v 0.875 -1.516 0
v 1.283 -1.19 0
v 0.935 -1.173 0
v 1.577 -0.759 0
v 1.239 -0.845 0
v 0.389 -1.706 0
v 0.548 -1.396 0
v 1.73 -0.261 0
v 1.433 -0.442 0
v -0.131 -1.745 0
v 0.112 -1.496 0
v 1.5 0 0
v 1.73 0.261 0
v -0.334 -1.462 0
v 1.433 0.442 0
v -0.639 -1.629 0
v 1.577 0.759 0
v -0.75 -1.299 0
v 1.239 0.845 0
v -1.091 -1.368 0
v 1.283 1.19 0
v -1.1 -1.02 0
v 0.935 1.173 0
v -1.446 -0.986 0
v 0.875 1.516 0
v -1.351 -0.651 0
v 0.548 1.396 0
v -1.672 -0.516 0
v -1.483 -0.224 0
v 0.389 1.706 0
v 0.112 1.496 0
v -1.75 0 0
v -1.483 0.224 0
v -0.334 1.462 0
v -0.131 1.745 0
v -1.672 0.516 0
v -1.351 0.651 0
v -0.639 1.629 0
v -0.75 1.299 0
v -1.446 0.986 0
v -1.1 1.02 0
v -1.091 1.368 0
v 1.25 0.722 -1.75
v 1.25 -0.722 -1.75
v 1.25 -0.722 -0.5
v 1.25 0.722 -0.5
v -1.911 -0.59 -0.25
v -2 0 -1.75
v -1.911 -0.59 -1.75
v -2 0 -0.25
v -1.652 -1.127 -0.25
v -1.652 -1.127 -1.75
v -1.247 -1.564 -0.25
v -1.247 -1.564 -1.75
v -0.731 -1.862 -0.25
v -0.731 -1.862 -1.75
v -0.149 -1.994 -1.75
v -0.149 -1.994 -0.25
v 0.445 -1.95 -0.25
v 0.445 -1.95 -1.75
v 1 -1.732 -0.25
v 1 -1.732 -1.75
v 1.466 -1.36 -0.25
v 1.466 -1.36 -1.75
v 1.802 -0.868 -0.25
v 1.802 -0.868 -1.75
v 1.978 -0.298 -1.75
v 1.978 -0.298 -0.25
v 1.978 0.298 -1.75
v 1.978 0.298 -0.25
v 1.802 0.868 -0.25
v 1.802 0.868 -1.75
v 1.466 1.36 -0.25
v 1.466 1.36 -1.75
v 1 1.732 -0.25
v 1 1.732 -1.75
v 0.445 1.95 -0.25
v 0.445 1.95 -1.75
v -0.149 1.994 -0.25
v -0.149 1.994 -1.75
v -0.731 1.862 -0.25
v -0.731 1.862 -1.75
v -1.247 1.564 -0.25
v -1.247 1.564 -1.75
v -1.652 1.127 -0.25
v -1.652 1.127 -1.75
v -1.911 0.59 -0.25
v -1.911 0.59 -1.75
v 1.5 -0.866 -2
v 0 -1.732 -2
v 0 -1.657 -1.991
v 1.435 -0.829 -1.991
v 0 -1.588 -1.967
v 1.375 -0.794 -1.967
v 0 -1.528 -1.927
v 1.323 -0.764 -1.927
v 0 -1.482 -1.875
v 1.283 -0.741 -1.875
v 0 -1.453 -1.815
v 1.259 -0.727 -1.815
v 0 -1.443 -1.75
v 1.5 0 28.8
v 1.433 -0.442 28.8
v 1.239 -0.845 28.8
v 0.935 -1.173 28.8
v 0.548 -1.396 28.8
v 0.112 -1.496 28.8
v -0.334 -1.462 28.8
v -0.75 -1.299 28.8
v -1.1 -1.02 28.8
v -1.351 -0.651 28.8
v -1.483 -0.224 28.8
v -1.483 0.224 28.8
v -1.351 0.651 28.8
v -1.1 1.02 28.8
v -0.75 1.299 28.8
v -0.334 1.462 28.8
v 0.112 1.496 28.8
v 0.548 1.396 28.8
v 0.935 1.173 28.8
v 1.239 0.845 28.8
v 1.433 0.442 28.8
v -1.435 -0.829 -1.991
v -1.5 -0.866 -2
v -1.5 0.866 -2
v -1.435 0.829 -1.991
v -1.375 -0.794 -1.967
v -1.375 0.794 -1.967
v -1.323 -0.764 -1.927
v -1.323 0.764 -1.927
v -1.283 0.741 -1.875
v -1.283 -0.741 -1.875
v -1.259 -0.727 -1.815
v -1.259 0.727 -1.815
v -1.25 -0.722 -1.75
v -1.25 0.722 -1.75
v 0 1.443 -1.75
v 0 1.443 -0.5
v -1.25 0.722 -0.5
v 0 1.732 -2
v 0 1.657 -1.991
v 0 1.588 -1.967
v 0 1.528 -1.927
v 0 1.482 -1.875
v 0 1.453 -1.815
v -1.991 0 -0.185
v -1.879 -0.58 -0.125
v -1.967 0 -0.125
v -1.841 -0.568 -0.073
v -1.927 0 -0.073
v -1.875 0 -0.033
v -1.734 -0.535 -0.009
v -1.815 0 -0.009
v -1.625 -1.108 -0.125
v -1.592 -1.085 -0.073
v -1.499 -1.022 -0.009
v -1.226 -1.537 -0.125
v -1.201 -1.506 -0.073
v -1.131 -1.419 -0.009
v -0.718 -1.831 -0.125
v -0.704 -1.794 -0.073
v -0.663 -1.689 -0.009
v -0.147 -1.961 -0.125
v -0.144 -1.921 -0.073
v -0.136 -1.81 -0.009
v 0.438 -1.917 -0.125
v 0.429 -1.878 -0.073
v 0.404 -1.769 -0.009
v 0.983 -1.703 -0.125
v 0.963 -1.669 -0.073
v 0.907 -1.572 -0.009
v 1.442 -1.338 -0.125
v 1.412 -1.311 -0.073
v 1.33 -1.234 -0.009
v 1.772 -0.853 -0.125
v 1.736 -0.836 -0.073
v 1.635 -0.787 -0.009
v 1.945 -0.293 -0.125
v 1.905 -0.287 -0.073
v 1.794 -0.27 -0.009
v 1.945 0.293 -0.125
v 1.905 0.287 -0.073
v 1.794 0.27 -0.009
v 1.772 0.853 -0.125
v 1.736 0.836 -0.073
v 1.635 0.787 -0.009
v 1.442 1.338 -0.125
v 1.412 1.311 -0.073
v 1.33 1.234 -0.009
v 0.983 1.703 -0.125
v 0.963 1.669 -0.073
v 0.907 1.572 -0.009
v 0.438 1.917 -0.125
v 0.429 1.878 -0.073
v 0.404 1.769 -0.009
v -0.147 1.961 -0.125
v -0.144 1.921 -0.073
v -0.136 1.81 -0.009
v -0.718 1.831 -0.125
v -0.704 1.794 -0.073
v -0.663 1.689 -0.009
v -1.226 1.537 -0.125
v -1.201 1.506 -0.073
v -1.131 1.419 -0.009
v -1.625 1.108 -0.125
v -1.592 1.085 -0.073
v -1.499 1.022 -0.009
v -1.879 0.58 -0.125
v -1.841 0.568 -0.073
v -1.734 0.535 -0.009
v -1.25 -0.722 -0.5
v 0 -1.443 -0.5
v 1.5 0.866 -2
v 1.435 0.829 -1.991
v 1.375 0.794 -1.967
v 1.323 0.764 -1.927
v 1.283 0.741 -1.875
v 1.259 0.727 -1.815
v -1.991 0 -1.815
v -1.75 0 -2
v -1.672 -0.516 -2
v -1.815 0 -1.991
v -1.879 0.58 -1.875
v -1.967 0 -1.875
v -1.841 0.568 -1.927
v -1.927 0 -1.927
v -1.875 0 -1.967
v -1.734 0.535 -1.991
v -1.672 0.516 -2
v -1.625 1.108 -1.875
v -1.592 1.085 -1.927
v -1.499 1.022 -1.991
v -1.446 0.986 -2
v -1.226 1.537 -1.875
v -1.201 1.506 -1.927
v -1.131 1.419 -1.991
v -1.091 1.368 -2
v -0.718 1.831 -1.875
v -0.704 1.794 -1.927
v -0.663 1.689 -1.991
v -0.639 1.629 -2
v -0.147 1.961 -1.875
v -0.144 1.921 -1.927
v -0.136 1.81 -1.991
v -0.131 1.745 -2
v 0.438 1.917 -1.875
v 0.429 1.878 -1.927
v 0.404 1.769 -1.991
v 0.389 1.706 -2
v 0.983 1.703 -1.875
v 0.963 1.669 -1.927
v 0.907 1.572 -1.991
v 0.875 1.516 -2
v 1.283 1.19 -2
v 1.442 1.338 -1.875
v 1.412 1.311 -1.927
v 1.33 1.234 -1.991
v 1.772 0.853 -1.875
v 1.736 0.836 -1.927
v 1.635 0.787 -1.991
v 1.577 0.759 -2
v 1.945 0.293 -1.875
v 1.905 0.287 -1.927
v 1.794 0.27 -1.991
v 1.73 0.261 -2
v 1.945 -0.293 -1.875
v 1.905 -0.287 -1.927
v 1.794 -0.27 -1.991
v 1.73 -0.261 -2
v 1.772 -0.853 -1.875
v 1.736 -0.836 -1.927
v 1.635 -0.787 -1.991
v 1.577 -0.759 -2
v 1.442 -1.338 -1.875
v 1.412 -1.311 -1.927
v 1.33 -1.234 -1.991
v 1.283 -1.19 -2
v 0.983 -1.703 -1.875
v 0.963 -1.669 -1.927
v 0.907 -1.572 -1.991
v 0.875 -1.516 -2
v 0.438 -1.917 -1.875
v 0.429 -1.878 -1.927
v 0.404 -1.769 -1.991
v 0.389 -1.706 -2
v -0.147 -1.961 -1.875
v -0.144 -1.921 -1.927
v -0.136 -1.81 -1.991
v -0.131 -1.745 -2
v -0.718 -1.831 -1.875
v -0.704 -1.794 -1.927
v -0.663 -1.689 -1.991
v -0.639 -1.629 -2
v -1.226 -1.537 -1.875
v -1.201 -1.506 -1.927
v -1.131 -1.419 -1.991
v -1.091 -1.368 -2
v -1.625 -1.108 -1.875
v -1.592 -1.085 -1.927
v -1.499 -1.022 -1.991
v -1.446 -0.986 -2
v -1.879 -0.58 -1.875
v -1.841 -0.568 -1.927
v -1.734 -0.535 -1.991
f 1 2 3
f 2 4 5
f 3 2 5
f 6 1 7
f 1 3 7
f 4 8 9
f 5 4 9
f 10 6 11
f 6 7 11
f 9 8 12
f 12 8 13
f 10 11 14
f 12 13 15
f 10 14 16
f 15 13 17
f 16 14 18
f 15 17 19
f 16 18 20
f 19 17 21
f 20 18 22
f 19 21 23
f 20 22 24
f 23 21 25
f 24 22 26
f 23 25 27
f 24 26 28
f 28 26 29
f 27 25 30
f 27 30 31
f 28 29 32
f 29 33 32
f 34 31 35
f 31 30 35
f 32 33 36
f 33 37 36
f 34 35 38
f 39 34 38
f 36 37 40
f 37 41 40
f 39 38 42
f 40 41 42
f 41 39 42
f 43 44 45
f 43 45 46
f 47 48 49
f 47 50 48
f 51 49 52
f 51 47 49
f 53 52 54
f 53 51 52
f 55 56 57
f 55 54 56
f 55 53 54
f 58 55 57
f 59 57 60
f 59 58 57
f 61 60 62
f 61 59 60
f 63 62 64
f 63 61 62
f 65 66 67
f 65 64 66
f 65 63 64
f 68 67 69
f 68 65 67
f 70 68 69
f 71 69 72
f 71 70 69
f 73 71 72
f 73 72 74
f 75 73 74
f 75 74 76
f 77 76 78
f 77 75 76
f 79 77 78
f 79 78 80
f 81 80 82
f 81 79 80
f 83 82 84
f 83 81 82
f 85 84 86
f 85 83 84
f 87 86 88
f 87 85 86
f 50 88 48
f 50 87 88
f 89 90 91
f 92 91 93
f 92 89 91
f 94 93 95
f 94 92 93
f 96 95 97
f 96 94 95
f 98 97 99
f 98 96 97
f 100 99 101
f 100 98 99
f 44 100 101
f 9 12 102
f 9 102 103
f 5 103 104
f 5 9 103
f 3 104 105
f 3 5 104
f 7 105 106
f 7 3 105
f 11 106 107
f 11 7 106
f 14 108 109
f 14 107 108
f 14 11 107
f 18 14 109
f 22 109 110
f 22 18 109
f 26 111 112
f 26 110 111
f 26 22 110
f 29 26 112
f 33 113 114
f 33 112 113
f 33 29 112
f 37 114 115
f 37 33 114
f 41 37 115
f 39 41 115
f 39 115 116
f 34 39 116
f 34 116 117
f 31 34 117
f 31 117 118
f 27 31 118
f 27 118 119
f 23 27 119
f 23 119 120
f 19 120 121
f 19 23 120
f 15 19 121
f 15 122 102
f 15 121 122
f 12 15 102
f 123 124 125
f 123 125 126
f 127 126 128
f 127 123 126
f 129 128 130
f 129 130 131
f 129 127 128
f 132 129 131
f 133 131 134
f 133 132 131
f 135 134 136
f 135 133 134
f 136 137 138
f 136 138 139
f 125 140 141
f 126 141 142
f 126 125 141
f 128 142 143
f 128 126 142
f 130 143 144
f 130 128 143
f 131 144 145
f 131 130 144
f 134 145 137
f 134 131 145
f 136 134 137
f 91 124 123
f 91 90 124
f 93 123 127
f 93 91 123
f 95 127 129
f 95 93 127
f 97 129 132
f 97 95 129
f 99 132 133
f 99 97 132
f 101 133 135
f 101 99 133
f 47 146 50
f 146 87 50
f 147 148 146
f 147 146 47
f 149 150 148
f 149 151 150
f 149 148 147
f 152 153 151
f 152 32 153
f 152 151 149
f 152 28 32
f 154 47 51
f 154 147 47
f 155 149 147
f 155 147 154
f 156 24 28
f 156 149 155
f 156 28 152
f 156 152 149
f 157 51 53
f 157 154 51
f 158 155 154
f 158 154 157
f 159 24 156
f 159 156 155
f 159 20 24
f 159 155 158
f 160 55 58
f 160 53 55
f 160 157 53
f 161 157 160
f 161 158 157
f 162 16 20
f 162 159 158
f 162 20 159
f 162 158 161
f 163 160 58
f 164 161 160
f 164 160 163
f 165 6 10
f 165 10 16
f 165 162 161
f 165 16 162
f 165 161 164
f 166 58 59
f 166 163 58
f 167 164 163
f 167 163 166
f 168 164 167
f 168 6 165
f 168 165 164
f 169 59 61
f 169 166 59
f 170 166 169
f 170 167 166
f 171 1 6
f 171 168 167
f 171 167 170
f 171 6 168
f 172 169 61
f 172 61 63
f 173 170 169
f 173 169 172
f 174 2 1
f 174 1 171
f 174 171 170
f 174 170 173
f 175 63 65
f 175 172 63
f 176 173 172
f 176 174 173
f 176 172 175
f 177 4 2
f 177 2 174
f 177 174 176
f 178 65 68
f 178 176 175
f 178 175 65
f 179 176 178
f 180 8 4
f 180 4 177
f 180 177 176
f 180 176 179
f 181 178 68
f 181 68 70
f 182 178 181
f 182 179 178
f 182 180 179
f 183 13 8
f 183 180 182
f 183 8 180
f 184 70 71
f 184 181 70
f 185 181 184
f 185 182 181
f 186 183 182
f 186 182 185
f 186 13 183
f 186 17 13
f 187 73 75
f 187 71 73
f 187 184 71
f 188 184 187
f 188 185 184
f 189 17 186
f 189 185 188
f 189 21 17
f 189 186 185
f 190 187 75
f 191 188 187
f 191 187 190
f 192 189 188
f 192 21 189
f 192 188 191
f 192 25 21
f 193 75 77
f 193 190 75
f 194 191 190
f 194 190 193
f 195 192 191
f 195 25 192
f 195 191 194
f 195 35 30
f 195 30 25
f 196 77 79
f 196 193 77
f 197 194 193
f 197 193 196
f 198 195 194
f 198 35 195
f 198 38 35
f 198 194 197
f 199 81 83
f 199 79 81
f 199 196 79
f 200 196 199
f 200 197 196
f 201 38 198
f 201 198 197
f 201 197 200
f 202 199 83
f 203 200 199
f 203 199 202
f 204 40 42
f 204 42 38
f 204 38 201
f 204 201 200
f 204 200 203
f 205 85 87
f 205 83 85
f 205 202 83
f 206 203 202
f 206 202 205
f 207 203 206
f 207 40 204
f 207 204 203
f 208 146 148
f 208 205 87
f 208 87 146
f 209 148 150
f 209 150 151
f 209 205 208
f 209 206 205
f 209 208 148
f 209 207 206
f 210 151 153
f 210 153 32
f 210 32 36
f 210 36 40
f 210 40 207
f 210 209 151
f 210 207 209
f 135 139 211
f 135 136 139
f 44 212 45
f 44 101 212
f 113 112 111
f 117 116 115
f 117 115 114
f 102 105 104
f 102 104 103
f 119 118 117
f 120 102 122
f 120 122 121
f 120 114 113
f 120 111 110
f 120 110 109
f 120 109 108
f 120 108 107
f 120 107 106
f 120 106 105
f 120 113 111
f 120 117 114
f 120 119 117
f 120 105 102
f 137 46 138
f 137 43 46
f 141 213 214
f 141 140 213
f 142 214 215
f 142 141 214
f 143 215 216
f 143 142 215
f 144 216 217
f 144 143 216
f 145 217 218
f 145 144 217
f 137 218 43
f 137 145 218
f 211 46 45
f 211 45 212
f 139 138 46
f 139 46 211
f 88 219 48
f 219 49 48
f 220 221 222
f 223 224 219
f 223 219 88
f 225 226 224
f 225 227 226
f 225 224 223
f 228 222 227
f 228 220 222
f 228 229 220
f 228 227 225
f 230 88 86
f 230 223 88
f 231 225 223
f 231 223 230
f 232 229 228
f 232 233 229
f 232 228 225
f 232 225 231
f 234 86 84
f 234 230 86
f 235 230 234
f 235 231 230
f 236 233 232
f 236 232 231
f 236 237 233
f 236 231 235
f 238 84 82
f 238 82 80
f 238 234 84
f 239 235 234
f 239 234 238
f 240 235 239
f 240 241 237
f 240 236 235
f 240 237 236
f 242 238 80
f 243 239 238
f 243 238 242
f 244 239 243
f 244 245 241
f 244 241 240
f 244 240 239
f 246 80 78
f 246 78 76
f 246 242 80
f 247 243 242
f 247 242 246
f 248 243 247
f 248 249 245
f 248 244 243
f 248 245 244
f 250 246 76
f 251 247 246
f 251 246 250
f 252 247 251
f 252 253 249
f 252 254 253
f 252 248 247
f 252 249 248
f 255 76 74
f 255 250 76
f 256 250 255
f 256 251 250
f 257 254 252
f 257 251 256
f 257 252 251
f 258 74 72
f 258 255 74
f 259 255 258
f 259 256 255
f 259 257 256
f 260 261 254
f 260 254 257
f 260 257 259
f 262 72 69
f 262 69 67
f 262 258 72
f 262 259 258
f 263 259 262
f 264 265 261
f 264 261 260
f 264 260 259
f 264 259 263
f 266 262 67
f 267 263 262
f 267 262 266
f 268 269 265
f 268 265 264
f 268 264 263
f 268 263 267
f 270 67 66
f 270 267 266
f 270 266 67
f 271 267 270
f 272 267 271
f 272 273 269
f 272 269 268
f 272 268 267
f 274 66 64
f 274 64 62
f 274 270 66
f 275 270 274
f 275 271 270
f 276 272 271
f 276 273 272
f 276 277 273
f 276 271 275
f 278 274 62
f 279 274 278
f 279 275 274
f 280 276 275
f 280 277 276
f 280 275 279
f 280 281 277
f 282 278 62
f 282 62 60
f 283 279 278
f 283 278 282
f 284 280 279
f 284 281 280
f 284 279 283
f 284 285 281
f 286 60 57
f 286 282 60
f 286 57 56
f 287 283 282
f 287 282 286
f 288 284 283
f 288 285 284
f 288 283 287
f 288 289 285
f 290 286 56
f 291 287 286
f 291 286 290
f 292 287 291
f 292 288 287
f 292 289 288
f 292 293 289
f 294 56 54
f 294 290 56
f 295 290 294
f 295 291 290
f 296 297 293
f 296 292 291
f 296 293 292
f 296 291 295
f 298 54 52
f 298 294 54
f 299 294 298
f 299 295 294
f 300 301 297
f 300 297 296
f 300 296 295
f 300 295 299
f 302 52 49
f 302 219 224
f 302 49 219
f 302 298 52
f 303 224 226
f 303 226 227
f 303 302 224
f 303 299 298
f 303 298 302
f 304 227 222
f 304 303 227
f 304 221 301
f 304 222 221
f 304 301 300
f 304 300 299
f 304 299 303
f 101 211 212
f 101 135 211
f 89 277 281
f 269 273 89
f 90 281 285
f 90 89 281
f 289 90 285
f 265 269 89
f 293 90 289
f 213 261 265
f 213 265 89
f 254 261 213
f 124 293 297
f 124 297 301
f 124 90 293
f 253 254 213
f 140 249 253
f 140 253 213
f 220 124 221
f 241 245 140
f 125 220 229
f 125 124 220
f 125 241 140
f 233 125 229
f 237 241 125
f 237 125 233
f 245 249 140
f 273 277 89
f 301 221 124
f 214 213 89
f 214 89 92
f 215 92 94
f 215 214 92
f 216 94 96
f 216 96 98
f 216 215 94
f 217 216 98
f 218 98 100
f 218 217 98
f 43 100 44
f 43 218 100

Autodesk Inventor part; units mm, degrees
ref_plane "YZ Plane" through (0, 0, 0) normal (1, 0, 0) x (0, 1, 0)
ref_plane "XZ Plane" through (0, 0, 0) normal (0, 1, 0) x (-1, 0, 0)
ref_plane "XY Plane" through (0, 0, 0) normal (0, 0, 1) x (1, 0, 0)
sketch "Sketch1" plane through (0, 0, 0) normal (0, 0, 1) x (1, 0, 0)
  circle A0 centre (0, 0) radius 1.5
  dimension "d0" = 3
extrude "Extrusion1" add sketch "Sketch1" along normal blind 28.8
thread "Thread1" size "M3x0.5" class "6g" standard "ANSI Metric M Profile" full length
sketch "Sketch2" plane through (0, 0, 0) normal (0, 0, -1) x (-1, 0, 0)
  circle A0 centre (0, 0) radius 2
  dimension "d5" = 4
extrude "Extrusion2" add sketch "Sketch2" along normal blind 2
sketch "Sketch3" plane through (0, 0, -2) normal (0, 0, -1) x (-1, 0, 0)
  circle A0 centre (0, 0) radius 1.5 projected
  line L0 (0, -1.4434) -> (-1.25, -0.7217)
  line L1 (-1.25, -0.7217) -> (-1.25, 0.7217)
  line L2 (-1.25, 0.7217) -> (0, 1.4434)
  line L3 (0, 1.4434) -> (1.25, 0.7217)
  line L4 (1.25, 0.7217) -> (1.25, -0.7217)
  line L5 (1.25, -0.7217) -> (0, -1.4434)
  dimension "d8" = 1.25
extrude "Extrusion3" cut sketch "Sketch3" against normal blind 1.5 contours L0 L1 L2 L3 L4 L5
fillet "Fillet1" radius 0.25 8 edges at (2, 0, 0) (2, 0, -2) (-0.625, -1.0825, -2) (-1.25, 0, -2) (-0.625, 1.0825, -2) (0.625, 1.0825, -2) (1.25, 0, -2) (0.625, -1.0825, -2)
properties part number "AdjBolt" material "Stainless Steel"
